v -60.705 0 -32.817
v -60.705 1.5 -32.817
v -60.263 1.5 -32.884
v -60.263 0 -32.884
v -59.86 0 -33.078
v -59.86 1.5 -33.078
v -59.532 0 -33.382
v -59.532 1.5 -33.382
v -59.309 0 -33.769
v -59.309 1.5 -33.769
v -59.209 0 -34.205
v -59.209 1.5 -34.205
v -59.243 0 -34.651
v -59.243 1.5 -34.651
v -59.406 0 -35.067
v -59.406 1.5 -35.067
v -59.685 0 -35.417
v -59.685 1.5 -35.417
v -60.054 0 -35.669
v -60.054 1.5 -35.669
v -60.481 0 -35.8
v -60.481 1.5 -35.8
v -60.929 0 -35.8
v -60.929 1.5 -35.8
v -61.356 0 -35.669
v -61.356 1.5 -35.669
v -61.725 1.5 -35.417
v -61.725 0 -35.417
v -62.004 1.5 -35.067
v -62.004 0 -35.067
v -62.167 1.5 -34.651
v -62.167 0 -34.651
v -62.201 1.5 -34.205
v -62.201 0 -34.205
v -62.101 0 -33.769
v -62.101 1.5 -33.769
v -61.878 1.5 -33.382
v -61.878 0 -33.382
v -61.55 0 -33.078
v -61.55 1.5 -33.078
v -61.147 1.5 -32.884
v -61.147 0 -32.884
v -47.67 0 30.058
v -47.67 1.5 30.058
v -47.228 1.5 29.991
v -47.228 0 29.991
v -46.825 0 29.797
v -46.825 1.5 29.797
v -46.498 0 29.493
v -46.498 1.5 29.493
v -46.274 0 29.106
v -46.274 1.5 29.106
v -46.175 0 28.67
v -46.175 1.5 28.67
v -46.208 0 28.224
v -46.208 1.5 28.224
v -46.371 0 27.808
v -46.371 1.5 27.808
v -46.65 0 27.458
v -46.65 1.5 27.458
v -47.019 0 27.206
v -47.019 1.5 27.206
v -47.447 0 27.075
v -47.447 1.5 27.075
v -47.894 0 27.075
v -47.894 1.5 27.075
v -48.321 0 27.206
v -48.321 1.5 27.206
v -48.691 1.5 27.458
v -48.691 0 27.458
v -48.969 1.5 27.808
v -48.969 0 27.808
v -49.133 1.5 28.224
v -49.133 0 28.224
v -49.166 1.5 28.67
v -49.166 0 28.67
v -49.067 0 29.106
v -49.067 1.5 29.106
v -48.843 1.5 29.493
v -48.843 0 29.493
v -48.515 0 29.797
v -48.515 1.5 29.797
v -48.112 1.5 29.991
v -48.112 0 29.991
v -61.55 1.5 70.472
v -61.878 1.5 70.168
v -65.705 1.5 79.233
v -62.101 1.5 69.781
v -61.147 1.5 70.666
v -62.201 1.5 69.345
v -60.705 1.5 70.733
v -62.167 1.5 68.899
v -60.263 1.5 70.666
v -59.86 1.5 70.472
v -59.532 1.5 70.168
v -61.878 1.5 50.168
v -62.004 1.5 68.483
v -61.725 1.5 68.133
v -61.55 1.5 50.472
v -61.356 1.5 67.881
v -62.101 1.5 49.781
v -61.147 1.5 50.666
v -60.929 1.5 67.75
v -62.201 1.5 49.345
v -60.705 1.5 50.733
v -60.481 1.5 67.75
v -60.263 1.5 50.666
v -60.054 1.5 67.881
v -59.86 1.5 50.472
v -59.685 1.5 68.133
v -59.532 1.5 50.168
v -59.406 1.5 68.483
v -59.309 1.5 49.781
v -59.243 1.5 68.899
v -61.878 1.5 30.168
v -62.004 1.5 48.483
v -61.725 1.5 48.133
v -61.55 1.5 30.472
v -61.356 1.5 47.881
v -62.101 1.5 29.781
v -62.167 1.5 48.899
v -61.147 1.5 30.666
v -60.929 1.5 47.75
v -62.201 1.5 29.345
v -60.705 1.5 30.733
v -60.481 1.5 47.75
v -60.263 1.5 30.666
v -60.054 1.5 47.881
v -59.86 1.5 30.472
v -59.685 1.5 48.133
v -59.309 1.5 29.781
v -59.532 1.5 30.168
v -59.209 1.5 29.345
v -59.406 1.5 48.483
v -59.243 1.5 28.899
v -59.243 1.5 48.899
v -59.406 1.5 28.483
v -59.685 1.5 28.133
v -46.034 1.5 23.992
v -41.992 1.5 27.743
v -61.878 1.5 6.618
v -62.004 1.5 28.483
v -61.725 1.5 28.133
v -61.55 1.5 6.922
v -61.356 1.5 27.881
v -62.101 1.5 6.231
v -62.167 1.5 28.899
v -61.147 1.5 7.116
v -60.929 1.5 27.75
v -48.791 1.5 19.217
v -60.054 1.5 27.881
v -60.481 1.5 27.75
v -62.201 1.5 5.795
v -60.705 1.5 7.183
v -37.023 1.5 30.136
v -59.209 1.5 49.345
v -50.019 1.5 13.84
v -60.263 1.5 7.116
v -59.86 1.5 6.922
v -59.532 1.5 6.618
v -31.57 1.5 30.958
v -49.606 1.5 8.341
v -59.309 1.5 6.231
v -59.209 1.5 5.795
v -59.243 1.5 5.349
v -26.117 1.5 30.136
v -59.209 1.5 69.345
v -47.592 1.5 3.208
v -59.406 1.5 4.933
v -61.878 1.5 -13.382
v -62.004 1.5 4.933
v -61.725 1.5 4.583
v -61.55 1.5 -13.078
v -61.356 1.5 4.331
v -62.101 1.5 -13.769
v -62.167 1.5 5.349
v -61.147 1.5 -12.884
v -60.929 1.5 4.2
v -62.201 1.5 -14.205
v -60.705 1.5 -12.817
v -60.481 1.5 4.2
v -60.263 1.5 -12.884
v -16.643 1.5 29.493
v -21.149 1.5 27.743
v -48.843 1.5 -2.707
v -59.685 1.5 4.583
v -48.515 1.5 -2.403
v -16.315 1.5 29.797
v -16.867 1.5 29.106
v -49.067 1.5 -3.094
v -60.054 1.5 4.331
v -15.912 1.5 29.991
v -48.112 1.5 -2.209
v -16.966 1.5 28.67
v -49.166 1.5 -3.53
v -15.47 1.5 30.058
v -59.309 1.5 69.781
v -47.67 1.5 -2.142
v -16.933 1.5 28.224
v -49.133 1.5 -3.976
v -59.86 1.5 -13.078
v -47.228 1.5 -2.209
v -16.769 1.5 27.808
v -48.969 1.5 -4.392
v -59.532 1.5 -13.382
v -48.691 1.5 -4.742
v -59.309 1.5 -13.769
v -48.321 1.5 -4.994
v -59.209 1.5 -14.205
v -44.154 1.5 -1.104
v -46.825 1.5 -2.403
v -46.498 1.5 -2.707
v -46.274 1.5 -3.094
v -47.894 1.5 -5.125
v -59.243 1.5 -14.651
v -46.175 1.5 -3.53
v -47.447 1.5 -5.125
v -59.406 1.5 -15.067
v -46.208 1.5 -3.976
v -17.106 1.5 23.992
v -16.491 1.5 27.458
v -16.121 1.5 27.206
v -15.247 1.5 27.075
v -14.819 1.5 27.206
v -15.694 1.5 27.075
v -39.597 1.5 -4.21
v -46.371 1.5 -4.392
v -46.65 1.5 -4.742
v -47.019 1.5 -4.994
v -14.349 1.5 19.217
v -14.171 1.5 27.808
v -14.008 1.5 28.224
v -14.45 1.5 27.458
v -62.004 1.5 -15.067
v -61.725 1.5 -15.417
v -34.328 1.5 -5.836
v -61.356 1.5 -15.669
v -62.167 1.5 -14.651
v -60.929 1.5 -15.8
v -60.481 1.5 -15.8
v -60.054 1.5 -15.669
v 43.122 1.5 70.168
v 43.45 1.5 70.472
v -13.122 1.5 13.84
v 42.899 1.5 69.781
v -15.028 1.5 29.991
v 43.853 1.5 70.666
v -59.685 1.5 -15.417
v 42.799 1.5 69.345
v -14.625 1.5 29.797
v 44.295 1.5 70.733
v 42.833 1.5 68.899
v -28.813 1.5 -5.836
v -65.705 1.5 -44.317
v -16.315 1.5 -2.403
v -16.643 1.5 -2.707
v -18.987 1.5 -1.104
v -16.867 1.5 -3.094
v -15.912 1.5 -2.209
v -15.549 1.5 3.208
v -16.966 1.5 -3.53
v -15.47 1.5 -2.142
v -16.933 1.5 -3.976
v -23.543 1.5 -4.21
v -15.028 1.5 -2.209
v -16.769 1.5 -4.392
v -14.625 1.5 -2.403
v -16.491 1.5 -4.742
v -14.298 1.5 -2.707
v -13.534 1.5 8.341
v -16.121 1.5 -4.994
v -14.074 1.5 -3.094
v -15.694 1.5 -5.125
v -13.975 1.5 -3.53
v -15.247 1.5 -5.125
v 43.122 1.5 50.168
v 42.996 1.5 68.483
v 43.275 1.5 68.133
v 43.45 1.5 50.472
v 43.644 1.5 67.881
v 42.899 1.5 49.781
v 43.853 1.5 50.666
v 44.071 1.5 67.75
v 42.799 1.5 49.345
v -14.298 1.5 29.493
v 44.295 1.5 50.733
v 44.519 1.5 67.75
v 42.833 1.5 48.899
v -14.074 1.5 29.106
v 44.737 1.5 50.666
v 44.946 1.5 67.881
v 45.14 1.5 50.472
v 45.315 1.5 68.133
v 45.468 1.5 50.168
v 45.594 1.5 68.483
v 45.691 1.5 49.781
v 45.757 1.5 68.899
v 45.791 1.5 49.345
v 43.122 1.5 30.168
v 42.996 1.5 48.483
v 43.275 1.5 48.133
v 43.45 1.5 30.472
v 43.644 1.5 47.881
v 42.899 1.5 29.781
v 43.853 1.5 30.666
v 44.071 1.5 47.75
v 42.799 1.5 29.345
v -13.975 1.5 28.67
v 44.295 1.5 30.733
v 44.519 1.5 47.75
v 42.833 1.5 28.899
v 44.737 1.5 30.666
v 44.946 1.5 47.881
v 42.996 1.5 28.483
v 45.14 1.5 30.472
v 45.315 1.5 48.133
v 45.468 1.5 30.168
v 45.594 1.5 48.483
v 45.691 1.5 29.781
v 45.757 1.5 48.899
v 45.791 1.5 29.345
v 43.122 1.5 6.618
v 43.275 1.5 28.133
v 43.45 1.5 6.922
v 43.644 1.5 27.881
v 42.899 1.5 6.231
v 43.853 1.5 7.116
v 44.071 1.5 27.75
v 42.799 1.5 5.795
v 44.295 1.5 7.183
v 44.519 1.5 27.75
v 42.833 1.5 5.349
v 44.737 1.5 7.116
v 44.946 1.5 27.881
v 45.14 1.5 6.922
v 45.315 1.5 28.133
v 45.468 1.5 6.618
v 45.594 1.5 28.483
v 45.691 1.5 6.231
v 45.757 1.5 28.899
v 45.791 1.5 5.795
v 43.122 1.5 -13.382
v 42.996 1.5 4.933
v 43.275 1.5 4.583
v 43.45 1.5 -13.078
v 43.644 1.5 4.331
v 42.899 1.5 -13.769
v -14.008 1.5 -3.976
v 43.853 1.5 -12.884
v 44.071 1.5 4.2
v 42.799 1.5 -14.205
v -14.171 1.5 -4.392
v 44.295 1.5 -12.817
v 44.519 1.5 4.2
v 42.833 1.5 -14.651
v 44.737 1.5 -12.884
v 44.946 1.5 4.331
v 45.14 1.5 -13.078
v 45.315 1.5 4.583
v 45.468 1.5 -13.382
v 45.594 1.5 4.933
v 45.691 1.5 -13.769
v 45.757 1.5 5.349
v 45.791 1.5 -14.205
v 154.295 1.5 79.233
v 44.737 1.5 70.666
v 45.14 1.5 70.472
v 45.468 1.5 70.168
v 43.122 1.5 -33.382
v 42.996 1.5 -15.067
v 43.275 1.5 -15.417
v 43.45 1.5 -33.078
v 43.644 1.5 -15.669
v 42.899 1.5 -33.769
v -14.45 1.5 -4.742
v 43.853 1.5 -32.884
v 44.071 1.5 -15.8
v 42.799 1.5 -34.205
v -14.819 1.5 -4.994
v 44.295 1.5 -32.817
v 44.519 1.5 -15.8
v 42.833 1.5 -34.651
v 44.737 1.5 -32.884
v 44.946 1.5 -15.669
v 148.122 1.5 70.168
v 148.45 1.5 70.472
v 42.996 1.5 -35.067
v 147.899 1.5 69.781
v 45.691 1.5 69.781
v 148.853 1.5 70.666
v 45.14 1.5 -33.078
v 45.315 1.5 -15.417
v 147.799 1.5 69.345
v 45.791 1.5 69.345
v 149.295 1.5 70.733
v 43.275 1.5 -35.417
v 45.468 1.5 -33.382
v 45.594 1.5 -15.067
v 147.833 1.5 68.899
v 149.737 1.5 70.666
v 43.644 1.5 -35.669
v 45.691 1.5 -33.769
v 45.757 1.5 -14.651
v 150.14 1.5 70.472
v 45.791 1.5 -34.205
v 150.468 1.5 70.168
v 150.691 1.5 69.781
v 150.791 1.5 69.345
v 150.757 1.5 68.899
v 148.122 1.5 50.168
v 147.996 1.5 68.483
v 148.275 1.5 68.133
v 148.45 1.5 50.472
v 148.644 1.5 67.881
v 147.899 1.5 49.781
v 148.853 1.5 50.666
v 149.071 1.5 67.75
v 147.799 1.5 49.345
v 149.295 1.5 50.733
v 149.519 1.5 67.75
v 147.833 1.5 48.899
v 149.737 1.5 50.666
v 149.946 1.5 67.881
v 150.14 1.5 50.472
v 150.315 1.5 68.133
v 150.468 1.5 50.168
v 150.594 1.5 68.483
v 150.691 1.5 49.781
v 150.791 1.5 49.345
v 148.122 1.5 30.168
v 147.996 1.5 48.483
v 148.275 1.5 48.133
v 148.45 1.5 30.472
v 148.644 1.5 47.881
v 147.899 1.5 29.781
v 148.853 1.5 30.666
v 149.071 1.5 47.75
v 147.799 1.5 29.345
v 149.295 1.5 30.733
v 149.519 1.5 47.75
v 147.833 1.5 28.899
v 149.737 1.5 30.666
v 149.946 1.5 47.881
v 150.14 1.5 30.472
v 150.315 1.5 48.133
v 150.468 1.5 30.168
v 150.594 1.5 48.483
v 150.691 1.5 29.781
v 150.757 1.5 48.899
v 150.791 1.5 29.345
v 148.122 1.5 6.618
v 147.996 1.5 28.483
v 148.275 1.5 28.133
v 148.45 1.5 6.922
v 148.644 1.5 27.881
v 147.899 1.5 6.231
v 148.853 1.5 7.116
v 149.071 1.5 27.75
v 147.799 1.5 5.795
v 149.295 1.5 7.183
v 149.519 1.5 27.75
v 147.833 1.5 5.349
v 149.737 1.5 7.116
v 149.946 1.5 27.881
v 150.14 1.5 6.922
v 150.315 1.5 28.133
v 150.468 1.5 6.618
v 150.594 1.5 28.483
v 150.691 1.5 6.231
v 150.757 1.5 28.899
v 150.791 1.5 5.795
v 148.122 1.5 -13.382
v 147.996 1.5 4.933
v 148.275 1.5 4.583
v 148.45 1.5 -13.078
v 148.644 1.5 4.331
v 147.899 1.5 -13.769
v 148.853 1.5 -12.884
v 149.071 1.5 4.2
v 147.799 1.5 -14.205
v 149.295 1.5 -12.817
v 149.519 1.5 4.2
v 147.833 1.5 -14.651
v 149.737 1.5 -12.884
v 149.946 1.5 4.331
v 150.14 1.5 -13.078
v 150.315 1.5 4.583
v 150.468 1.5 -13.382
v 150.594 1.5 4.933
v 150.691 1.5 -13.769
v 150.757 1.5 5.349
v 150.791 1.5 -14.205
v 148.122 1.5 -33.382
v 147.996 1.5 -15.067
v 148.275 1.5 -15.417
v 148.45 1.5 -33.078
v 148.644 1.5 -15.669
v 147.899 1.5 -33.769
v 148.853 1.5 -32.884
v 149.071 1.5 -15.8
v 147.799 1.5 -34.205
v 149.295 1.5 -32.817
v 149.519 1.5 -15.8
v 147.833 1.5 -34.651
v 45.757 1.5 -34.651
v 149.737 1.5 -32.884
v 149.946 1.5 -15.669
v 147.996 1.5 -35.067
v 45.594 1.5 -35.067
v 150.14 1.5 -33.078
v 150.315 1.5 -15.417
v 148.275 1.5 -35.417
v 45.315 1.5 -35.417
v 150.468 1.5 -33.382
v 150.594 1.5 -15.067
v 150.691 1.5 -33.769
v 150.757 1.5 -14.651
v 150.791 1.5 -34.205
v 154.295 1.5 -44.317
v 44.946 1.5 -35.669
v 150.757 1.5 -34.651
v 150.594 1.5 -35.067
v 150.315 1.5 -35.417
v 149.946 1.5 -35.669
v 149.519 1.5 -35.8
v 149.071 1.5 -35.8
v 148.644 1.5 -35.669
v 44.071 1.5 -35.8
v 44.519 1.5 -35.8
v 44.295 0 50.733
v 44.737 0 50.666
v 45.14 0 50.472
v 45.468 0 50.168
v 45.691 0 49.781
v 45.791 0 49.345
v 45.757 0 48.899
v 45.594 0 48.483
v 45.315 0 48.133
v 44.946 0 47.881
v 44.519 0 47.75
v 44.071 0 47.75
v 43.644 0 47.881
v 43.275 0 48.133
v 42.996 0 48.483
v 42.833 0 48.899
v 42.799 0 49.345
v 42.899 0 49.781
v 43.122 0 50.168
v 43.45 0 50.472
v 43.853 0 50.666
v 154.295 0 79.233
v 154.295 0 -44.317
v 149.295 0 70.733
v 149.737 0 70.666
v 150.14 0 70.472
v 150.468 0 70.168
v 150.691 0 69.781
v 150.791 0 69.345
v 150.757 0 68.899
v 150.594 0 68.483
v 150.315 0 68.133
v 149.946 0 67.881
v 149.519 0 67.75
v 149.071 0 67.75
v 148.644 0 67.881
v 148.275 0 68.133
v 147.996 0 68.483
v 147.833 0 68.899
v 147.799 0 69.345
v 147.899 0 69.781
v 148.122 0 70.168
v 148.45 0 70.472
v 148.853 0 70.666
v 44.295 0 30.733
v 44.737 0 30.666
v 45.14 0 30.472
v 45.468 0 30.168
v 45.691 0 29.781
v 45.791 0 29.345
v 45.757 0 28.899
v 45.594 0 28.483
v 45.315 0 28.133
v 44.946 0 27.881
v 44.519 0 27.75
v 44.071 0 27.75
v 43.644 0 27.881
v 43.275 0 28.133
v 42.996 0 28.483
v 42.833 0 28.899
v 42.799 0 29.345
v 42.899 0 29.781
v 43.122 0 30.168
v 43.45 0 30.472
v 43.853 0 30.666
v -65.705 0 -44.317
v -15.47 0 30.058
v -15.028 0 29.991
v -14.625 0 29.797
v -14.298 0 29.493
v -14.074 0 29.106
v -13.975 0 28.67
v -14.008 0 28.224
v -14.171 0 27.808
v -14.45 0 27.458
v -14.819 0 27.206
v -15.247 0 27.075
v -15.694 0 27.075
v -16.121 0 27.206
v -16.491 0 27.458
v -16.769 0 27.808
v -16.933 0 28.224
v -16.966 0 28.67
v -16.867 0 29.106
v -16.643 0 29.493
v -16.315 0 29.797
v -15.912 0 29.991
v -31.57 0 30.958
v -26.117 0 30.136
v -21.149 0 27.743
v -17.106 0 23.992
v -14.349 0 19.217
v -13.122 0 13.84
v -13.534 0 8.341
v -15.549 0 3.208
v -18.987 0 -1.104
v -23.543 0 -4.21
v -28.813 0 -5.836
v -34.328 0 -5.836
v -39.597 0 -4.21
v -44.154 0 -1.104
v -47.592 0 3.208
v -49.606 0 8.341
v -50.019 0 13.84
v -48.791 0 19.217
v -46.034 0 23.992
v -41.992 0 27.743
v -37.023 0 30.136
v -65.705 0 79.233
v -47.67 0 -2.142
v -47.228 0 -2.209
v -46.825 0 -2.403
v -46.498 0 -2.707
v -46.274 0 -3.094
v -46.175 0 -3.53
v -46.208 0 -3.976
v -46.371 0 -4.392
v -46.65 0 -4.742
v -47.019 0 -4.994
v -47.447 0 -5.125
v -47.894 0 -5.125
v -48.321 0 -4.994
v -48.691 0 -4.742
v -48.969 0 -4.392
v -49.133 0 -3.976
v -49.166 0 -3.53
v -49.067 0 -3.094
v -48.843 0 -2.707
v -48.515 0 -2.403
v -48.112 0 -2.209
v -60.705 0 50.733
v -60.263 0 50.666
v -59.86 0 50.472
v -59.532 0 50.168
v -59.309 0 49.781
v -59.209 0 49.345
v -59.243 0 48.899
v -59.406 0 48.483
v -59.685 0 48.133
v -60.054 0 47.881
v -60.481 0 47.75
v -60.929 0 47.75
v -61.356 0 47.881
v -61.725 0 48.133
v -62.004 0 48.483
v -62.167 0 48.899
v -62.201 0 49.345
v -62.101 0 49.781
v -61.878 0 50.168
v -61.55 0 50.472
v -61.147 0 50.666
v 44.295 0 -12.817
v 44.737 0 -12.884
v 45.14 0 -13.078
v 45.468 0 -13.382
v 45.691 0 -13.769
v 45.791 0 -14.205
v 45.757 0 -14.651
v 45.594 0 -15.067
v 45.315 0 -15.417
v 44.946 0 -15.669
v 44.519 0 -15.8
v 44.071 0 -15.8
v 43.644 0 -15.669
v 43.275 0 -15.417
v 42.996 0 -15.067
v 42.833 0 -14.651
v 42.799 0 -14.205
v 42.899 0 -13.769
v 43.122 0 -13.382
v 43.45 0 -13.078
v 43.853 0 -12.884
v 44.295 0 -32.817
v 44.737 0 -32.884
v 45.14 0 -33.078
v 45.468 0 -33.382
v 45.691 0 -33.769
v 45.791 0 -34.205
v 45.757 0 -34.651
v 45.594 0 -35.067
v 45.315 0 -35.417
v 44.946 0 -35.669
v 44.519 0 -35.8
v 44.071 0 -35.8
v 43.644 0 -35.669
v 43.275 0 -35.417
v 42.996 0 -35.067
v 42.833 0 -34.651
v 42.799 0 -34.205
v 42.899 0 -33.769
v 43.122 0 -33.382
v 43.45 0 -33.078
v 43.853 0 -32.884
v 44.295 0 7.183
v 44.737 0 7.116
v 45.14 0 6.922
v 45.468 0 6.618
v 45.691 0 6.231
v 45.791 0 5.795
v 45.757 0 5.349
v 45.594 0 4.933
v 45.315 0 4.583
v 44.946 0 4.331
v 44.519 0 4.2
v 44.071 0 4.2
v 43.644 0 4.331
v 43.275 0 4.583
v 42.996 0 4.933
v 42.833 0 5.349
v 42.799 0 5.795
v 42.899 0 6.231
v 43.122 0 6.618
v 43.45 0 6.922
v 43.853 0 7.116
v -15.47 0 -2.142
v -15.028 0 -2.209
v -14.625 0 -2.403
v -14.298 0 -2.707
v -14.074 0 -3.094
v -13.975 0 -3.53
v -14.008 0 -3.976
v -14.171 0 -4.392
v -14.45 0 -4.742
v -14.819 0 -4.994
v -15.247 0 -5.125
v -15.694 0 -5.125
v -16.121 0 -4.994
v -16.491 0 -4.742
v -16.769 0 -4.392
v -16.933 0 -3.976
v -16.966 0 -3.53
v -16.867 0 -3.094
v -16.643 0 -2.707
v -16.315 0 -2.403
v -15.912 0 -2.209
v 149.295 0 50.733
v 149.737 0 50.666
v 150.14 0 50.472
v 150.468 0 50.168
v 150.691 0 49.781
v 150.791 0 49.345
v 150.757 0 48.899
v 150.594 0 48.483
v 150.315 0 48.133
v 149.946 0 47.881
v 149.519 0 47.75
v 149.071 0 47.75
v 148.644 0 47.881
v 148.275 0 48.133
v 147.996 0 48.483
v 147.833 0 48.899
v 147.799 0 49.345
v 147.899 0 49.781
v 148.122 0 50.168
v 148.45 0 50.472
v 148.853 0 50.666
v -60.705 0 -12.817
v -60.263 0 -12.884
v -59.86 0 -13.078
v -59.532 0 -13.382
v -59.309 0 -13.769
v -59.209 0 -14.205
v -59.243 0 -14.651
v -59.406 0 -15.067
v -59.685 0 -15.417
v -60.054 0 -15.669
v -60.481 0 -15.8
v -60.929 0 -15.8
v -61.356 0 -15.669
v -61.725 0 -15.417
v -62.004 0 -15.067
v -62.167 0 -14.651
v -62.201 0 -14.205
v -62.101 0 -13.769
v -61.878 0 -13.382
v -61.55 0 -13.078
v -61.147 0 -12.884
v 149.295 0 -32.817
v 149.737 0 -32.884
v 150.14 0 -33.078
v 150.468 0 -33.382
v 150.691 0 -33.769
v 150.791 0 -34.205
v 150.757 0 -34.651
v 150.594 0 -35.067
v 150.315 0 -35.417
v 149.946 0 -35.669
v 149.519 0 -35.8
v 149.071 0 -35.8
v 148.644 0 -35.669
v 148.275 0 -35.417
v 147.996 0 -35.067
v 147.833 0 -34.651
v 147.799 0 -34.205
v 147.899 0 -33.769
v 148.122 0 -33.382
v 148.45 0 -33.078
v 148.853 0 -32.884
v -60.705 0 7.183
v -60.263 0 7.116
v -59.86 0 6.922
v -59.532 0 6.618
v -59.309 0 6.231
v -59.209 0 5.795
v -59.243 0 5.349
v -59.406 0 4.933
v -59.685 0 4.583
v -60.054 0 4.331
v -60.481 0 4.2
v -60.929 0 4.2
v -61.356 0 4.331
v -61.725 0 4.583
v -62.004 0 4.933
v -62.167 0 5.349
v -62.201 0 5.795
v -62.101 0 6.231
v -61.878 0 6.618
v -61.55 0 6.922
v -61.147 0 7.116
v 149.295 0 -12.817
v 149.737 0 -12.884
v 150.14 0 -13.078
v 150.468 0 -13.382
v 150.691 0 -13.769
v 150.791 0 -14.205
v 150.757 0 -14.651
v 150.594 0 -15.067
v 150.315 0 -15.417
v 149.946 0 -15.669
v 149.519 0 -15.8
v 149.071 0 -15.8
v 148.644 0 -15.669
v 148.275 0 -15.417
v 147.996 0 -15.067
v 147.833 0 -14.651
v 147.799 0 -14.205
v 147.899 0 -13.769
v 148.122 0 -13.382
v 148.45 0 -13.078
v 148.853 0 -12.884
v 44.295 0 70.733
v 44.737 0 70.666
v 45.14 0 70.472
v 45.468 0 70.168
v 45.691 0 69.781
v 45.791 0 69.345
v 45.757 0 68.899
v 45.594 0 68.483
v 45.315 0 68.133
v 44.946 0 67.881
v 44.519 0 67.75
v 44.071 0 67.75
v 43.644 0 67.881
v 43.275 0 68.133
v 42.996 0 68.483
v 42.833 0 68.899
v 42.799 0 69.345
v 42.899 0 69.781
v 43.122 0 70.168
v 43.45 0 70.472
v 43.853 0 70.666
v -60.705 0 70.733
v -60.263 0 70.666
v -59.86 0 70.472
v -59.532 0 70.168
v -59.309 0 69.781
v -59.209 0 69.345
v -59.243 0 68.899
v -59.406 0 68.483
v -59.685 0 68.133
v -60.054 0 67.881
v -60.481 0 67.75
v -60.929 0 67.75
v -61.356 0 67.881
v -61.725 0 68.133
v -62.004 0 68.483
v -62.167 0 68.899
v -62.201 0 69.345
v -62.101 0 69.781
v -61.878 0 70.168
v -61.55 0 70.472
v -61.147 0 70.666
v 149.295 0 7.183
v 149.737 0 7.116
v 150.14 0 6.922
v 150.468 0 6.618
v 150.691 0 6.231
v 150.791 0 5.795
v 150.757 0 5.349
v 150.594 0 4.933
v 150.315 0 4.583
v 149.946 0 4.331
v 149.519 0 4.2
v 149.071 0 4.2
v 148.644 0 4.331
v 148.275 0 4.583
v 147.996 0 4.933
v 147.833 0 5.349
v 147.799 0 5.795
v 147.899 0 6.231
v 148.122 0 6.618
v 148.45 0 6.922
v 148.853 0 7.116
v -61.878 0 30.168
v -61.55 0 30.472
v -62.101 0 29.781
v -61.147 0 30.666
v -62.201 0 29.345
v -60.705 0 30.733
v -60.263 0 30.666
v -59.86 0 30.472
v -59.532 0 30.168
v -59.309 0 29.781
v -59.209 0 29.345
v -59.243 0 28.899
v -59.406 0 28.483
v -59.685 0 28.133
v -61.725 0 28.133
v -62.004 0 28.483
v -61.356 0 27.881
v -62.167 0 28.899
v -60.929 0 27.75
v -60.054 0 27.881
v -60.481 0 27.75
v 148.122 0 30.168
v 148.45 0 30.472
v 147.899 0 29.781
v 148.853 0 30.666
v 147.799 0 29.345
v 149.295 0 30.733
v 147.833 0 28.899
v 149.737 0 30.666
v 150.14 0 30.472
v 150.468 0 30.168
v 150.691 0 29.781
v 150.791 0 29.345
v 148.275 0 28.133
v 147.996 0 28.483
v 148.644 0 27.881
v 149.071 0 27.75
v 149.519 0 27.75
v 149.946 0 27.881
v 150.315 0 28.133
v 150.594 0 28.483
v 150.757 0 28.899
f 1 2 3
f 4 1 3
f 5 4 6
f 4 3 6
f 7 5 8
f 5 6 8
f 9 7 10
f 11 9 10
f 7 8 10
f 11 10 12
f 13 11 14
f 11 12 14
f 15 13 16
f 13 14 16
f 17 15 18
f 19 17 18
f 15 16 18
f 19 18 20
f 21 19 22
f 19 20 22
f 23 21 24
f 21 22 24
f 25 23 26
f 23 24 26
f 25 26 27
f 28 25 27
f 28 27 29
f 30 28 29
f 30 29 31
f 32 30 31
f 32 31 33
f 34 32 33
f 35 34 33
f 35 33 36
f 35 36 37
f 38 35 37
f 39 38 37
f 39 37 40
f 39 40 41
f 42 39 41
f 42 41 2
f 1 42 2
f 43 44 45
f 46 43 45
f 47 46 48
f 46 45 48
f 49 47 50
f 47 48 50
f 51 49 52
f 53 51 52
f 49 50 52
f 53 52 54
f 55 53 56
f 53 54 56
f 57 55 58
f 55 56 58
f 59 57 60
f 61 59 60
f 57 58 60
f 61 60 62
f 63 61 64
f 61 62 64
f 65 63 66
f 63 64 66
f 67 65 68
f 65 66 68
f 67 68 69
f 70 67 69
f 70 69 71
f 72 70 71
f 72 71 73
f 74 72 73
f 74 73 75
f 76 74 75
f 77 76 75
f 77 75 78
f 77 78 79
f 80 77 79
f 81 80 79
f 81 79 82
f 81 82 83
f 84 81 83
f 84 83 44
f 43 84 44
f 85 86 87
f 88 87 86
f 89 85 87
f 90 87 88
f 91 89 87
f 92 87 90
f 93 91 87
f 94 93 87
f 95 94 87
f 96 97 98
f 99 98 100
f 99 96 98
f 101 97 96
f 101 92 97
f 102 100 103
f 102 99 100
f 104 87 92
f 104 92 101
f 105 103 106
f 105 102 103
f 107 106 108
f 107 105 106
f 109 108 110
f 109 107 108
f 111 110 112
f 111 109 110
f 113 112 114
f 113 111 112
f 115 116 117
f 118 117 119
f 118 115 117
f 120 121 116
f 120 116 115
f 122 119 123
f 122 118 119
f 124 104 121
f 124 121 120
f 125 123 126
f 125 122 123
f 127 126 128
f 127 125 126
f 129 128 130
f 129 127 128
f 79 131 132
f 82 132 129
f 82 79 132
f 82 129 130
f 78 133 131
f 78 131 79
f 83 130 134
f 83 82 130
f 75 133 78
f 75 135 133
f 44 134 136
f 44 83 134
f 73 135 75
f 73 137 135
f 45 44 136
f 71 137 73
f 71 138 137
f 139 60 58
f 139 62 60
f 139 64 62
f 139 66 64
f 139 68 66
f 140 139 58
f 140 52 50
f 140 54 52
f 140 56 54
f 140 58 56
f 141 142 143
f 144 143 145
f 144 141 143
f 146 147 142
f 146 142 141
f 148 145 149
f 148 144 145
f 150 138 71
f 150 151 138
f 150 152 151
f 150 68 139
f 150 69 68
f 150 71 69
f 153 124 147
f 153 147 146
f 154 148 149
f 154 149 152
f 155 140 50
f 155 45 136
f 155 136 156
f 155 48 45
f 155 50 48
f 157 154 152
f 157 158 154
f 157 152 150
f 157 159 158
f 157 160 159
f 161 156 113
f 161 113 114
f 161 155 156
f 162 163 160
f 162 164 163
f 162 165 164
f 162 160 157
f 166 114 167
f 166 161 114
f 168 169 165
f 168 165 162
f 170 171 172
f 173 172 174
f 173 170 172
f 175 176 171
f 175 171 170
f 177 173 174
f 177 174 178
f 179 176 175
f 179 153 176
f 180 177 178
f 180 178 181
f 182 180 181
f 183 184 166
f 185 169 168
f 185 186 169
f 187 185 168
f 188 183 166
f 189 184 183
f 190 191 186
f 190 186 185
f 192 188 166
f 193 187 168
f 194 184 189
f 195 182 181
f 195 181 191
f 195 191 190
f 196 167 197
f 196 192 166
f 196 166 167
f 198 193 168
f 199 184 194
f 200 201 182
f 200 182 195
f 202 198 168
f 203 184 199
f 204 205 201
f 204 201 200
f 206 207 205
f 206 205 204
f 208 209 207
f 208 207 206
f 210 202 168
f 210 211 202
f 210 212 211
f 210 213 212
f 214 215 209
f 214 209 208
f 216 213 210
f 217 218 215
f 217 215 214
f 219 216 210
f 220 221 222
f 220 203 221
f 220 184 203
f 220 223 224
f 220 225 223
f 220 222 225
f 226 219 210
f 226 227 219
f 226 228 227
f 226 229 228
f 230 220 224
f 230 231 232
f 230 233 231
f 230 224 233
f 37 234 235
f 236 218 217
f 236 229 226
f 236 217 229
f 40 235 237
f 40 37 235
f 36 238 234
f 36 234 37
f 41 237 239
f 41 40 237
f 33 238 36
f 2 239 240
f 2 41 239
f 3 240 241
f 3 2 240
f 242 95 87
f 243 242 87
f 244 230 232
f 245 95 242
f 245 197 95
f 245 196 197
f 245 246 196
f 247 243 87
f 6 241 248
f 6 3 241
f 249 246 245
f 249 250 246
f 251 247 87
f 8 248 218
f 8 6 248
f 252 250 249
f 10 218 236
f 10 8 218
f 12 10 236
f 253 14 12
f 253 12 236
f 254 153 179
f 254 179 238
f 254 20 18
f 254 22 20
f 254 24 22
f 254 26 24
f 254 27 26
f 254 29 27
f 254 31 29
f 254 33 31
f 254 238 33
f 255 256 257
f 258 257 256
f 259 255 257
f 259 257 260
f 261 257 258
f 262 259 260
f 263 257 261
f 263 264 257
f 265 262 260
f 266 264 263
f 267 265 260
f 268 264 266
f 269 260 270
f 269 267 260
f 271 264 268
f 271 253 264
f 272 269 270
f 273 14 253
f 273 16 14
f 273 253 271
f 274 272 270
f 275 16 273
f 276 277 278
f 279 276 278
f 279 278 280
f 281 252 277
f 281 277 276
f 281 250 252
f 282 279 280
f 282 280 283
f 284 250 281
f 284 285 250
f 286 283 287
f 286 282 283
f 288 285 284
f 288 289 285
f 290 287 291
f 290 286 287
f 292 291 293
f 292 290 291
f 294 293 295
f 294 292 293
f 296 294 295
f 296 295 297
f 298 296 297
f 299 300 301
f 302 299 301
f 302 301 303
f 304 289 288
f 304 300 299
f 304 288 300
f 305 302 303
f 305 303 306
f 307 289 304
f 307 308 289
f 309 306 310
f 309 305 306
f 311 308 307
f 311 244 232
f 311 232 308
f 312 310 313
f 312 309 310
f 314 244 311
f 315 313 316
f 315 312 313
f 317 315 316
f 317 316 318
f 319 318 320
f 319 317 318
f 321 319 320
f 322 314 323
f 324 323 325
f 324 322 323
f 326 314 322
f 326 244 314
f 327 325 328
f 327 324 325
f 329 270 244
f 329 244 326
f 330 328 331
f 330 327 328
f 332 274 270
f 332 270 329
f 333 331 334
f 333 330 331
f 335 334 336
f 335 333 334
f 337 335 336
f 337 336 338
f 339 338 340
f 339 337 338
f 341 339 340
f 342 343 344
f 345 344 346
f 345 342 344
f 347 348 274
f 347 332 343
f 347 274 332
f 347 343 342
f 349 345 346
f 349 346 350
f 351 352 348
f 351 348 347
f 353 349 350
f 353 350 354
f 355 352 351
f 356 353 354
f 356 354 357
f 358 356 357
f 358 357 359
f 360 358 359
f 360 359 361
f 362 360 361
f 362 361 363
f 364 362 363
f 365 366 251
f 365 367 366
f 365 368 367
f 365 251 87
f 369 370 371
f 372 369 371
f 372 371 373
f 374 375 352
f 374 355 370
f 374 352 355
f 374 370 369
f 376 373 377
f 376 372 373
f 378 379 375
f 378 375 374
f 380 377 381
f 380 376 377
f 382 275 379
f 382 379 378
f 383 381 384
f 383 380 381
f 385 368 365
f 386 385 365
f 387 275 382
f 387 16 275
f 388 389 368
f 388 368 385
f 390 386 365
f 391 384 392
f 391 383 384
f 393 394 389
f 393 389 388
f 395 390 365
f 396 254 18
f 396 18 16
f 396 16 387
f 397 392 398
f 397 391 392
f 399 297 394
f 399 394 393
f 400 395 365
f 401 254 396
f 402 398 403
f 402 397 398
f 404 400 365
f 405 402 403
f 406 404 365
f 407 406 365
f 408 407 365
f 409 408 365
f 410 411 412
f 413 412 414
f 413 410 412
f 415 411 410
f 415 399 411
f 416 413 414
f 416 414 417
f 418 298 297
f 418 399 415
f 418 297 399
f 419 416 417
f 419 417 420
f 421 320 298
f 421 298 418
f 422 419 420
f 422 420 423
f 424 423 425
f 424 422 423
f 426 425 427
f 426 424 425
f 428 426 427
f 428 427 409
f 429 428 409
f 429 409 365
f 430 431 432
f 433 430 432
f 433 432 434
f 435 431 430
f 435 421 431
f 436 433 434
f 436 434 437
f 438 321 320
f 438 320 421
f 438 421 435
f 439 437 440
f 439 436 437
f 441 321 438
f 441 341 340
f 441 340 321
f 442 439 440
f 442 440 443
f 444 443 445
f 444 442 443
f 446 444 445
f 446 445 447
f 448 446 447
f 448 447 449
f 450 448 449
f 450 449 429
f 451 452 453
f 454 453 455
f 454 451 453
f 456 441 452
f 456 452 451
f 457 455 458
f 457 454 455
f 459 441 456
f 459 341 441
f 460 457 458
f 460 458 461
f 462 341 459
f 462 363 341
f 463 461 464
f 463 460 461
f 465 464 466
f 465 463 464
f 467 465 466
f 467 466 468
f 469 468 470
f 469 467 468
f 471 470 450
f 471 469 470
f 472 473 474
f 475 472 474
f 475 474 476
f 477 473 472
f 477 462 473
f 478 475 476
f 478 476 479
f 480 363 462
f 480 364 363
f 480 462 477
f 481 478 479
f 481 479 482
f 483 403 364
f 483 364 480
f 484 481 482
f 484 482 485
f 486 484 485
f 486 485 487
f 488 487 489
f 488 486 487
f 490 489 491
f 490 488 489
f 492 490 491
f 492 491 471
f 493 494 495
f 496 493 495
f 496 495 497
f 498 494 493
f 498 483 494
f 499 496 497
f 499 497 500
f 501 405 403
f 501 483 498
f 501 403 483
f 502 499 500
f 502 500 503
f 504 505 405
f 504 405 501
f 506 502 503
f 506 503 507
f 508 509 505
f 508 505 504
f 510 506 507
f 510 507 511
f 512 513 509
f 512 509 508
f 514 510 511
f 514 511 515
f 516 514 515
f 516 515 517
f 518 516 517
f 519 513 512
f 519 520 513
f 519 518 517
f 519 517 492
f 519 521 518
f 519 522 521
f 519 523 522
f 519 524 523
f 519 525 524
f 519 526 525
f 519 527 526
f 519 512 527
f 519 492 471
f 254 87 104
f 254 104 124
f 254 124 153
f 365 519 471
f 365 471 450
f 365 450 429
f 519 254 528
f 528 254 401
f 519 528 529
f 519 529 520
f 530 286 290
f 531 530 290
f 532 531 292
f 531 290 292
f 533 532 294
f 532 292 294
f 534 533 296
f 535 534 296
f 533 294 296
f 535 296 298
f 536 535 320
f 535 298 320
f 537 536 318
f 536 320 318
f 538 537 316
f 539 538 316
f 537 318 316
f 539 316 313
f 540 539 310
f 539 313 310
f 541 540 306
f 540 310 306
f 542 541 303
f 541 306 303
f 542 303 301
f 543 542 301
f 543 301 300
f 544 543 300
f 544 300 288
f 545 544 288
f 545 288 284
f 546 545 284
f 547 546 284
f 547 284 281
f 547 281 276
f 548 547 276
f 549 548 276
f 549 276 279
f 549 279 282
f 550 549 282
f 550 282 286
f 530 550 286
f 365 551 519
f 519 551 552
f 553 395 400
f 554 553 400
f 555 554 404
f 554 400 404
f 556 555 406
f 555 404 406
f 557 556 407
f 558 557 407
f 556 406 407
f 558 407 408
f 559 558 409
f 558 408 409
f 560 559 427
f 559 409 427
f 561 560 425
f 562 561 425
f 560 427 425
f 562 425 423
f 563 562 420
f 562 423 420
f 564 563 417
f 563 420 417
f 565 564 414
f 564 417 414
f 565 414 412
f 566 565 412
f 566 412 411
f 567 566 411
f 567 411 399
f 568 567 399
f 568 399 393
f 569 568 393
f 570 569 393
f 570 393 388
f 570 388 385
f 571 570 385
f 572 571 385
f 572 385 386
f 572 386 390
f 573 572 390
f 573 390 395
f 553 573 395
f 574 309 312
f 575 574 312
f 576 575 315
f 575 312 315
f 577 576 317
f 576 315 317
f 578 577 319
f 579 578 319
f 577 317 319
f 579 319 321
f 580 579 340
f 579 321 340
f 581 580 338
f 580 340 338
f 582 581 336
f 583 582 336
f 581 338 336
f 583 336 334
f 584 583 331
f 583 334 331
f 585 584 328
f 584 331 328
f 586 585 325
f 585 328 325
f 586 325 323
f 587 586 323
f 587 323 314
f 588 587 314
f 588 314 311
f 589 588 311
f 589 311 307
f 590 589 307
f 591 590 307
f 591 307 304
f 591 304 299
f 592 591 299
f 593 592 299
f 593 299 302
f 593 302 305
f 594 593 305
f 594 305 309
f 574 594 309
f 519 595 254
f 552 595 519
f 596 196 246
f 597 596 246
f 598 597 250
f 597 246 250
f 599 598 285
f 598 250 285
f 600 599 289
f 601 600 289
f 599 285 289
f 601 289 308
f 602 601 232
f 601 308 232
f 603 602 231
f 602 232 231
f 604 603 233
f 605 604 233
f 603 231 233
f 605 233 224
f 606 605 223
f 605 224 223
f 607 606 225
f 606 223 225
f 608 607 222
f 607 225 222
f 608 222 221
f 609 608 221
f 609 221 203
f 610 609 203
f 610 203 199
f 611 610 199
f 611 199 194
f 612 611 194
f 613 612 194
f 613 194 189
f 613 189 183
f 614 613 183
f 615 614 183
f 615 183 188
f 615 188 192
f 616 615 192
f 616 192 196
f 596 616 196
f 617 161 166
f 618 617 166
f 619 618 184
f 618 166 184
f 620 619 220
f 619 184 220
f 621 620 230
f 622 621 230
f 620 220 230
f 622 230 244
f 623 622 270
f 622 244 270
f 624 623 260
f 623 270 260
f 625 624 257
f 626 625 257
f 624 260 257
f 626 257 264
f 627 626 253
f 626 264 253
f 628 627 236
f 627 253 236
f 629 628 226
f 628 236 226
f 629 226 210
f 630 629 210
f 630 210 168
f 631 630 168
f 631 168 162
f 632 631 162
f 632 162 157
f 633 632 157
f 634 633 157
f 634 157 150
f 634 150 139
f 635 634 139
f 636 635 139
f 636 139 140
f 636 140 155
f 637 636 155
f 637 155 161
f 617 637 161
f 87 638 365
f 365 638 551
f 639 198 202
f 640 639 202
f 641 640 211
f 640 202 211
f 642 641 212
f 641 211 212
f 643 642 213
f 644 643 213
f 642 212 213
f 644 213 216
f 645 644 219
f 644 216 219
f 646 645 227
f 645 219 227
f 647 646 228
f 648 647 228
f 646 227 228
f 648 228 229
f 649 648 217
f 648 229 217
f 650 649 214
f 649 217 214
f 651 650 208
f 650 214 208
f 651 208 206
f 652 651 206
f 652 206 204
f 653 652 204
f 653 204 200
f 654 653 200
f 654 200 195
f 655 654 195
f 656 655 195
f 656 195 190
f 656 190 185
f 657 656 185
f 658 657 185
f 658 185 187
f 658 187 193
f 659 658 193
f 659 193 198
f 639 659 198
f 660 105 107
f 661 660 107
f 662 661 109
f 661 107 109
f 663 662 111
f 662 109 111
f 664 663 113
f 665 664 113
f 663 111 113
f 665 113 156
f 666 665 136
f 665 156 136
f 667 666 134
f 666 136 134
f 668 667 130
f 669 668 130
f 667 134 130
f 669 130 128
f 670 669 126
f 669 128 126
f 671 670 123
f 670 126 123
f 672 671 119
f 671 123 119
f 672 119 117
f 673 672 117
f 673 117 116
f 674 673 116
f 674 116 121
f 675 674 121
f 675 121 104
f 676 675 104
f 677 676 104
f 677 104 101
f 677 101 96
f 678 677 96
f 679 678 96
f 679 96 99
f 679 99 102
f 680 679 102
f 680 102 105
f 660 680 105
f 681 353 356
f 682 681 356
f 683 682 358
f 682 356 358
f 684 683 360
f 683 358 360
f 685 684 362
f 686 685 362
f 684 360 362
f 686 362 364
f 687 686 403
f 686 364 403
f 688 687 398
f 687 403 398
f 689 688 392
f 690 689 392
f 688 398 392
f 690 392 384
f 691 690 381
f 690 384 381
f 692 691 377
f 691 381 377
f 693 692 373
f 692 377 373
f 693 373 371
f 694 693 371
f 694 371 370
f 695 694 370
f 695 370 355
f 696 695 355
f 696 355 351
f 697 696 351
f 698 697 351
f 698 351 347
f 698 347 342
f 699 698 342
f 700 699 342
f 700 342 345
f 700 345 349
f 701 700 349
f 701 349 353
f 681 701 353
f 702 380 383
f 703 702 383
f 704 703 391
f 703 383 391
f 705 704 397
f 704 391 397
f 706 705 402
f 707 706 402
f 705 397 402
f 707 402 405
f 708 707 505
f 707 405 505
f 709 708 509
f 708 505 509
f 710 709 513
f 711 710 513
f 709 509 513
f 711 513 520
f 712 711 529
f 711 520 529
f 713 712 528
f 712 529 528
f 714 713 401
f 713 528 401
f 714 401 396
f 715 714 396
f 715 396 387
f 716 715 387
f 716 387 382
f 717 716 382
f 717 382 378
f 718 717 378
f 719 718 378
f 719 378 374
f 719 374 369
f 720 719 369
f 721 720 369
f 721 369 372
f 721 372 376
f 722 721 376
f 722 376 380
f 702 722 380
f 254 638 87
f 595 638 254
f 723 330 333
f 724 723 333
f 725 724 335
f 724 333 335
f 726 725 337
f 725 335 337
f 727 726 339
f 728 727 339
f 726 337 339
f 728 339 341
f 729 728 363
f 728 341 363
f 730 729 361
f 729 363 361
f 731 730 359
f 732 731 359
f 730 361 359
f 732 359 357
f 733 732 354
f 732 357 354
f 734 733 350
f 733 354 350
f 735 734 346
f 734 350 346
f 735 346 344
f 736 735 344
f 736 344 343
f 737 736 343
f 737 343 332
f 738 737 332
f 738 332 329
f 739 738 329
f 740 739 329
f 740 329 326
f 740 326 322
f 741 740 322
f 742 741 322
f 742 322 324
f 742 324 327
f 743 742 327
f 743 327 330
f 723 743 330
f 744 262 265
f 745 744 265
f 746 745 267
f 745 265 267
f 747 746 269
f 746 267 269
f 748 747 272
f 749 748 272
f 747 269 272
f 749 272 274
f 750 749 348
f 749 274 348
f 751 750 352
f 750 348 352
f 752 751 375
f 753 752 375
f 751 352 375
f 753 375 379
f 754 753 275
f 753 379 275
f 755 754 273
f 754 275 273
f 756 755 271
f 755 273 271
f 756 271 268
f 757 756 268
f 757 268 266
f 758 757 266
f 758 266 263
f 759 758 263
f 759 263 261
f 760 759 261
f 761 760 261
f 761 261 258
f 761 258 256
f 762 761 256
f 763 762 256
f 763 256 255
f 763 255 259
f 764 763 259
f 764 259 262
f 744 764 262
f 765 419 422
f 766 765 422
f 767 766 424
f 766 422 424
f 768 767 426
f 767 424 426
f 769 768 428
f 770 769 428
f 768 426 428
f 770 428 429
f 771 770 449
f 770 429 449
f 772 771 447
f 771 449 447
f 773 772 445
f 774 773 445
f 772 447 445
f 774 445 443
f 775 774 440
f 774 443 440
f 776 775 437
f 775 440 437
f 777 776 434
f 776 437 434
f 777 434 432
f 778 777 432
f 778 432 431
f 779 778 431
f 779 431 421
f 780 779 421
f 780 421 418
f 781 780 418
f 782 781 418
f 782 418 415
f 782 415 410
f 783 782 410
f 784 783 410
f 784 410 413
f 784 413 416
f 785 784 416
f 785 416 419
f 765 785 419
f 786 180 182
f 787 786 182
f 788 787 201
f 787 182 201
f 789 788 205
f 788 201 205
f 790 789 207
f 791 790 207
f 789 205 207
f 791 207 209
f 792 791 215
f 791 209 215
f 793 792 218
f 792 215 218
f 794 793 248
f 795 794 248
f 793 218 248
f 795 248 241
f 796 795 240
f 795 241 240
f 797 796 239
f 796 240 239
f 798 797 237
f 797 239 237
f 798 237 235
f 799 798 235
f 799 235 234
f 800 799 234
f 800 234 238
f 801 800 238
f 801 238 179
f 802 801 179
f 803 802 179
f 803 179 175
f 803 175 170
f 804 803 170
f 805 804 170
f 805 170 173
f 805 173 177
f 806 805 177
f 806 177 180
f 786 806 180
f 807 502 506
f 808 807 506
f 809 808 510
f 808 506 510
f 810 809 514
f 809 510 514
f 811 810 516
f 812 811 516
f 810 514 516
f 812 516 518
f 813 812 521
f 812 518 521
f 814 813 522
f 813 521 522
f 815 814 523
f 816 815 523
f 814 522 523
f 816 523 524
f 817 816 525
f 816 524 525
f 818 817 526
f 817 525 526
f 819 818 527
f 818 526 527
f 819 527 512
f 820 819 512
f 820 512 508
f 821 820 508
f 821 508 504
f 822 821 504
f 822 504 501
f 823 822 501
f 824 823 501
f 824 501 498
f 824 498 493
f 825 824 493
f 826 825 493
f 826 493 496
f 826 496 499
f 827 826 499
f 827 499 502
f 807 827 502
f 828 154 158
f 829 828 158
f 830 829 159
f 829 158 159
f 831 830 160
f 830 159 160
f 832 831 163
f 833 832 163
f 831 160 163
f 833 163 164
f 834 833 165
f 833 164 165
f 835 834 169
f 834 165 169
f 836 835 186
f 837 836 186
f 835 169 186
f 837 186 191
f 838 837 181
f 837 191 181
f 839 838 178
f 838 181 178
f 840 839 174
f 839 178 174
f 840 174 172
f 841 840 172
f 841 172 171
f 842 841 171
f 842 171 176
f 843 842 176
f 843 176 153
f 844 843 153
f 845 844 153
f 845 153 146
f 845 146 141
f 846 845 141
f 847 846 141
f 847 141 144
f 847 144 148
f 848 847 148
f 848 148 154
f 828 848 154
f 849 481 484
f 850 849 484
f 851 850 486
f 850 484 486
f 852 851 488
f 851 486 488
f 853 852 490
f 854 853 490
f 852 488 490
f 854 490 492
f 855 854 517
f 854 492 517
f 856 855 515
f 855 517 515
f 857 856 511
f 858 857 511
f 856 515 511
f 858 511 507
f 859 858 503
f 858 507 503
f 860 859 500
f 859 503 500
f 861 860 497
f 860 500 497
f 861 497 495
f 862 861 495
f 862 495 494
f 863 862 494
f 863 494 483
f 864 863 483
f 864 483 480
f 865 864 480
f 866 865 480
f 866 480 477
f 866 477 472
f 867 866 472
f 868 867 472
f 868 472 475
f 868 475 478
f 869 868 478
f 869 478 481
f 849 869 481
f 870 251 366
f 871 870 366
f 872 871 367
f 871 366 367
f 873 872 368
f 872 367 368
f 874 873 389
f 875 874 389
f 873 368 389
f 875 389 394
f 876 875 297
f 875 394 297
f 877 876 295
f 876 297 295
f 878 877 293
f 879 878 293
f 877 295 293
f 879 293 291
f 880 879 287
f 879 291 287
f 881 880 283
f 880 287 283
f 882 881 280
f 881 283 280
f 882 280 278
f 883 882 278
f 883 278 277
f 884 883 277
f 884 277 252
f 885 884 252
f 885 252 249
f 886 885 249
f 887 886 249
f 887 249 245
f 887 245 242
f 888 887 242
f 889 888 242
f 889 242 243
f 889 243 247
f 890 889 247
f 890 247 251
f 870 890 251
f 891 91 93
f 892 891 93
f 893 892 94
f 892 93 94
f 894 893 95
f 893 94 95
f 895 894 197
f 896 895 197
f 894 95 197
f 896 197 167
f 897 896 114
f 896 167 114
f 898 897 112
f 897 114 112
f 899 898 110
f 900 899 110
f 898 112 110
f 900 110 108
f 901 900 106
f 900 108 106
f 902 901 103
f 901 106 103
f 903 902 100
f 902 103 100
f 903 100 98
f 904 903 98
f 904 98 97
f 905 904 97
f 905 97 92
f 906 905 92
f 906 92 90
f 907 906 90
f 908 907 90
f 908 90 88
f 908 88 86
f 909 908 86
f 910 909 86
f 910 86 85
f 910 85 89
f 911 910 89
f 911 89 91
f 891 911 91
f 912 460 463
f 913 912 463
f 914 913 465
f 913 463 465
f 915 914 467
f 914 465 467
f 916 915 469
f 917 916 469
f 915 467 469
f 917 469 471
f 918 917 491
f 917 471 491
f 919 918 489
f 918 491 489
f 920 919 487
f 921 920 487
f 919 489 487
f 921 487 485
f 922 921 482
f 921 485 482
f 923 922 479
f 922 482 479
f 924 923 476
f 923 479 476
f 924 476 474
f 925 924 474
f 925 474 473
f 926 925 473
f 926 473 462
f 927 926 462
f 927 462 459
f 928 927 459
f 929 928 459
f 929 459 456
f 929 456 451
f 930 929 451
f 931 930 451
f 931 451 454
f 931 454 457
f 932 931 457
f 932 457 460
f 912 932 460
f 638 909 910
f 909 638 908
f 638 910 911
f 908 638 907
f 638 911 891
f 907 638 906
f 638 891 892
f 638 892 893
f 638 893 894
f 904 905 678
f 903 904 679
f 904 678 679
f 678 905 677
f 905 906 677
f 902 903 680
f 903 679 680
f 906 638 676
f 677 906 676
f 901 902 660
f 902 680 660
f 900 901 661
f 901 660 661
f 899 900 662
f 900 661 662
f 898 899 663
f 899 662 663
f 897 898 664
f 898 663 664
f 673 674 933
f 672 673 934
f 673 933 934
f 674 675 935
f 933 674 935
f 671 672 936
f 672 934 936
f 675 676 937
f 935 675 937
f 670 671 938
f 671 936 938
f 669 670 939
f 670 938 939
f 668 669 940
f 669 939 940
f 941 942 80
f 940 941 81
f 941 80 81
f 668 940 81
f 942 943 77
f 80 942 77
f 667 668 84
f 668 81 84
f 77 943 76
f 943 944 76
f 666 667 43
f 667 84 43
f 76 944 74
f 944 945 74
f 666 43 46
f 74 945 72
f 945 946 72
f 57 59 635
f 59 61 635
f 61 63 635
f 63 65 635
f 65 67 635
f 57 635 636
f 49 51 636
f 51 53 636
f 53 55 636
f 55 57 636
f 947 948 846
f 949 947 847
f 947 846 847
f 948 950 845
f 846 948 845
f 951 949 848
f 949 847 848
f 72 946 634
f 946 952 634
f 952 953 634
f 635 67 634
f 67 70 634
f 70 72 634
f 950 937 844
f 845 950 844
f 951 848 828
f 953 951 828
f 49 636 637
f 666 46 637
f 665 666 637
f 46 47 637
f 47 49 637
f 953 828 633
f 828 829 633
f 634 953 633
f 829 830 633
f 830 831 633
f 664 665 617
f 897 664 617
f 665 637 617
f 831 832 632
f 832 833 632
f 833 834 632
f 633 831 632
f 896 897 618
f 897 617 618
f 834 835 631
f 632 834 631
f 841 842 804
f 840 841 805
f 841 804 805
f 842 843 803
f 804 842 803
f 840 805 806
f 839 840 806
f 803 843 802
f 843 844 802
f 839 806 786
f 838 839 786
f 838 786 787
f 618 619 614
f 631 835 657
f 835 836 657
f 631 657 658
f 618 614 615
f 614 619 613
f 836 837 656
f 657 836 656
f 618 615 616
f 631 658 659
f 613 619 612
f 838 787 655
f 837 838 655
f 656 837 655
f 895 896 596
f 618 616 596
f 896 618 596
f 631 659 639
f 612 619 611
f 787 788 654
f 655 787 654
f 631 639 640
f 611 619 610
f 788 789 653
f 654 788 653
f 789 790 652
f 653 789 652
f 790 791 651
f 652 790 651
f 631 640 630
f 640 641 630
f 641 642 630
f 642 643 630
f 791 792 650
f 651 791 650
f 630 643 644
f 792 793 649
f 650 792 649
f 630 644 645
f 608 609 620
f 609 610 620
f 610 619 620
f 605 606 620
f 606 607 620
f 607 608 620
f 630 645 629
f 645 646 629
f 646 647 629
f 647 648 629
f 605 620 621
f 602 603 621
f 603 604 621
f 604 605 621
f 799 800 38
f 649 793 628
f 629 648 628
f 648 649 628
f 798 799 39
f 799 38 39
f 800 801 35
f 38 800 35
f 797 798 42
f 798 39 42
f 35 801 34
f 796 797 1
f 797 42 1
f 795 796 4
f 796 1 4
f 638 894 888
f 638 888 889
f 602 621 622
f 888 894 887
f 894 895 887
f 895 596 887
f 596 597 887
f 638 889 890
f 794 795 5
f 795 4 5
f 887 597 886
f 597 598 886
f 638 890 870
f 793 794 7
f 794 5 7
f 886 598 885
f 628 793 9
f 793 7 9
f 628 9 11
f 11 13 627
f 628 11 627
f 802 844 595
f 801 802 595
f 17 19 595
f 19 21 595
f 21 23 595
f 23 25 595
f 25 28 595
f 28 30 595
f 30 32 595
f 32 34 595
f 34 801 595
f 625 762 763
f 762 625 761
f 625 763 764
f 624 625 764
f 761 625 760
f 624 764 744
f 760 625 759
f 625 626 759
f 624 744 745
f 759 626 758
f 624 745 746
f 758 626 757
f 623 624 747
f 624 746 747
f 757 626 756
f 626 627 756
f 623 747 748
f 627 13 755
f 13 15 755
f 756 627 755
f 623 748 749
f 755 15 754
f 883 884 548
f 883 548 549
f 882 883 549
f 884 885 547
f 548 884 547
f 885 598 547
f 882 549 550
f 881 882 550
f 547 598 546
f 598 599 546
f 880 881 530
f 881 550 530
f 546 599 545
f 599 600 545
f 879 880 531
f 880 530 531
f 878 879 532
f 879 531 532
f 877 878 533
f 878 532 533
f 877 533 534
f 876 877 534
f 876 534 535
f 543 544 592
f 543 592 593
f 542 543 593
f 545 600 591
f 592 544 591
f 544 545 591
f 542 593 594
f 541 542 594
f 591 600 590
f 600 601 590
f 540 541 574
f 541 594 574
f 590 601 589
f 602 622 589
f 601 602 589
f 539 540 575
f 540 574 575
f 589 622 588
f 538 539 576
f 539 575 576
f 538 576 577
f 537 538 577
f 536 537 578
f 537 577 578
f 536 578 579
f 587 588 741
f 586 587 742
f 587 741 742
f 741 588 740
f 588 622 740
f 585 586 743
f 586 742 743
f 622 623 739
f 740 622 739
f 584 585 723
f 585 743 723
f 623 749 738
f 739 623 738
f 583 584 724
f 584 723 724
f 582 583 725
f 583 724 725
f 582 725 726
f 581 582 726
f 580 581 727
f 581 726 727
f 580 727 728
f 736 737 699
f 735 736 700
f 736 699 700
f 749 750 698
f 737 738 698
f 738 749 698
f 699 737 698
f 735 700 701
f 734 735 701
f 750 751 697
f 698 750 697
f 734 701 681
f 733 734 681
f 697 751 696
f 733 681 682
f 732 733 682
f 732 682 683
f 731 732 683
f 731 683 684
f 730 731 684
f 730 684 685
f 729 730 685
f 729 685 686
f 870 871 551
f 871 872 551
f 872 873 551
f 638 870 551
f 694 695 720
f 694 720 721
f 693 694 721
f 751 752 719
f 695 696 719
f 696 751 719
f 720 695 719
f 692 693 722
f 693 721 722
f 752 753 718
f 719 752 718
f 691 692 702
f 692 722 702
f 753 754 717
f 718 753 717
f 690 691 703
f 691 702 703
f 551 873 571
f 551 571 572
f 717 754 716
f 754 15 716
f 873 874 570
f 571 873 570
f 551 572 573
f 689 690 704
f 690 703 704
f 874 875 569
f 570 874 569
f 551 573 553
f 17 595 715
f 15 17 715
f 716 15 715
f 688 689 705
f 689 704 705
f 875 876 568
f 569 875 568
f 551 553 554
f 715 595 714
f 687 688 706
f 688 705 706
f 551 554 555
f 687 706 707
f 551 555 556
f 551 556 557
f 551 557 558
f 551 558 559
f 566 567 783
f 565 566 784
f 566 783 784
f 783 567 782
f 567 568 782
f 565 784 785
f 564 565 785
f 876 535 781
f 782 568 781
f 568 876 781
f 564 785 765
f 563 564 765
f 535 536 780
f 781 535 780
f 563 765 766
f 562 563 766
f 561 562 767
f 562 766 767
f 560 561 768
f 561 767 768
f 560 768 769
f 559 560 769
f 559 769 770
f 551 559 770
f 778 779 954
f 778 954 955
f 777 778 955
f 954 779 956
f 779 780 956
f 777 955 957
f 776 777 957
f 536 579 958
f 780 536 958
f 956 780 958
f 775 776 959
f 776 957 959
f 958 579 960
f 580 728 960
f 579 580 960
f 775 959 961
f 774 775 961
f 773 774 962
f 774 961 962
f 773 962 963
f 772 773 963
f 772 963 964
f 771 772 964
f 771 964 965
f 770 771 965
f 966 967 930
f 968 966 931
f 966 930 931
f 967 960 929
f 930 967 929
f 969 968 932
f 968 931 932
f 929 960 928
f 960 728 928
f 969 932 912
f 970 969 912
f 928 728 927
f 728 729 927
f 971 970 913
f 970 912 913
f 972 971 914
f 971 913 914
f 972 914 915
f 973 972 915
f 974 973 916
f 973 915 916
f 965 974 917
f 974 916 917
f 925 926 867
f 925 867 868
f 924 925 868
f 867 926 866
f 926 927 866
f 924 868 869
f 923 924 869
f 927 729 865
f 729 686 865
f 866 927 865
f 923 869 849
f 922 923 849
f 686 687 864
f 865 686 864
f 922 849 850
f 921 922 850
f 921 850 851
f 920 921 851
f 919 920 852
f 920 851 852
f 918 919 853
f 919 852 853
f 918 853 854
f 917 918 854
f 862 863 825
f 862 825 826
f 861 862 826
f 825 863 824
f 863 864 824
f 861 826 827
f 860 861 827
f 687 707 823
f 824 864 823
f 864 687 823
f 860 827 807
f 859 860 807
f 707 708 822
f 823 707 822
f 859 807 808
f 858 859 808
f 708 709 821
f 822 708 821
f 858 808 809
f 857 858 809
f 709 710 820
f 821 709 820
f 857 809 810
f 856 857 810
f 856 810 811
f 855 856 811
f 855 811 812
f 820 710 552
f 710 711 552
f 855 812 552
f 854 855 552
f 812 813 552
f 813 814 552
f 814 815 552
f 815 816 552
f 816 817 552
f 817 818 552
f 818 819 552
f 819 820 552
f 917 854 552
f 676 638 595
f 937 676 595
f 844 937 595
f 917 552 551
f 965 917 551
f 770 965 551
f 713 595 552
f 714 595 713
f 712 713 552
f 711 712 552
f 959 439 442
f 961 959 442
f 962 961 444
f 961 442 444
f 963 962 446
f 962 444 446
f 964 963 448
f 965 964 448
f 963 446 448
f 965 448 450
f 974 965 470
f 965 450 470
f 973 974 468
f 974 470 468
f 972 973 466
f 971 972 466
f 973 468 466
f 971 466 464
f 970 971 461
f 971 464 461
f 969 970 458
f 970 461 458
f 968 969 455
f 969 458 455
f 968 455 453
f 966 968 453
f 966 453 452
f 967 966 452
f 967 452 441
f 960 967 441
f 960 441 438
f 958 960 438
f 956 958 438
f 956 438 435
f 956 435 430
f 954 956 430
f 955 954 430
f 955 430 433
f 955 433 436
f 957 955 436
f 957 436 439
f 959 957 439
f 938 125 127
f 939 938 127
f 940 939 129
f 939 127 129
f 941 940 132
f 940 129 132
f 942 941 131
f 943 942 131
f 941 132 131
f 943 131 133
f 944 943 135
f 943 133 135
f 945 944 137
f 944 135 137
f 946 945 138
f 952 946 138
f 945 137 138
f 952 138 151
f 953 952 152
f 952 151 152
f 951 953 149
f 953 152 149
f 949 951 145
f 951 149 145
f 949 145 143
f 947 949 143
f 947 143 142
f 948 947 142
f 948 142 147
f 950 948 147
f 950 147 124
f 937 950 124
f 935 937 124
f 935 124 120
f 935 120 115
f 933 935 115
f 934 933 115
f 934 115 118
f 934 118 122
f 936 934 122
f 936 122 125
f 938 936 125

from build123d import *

# Parameters (mm, degrees)
SKETCH_1_W          = 220
SKETCH_1_H          = 123.55
EXTRUDE_1_DEPTH     = 1.5
SKETCH_2_R          = 18.5
SKETCH_2_R_2        = 1.5
CUT_EXTRUDE_1_DEPTH = 10


with BuildPart() as part:
    # 草图1 → 凸台-拉伸1 (new body)
    with BuildSketch(Plane(origin=(0, 0, 0), x_dir=(1, 0, 0), z_dir=(0, 1, 0))):
        with Locations((44.295012832, -17.457747405)):
            Rectangle(SKETCH_1_W, SKETCH_1_H)
    extrude(amount=EXTRUDE_1_DEPTH)

    # 草图2 → 切除-拉伸1 (cut)
    with BuildSketch(Plane(origin=(0, 1.5, 0), x_dir=(1, 0, 0), z_dir=(0, 1, 0))):
        with Locations(Location((-31.57031265, -12.457747405, 0), (0, 0, 270))):
            Circle(SKETCH_2_R)
        with Locations(Location((-47.67031265, 3.642252595, 0), (0, 0, 270))):
            Circle(SKETCH_2_R_2)
        with Locations(Location((-47.67031265, -28.557747405, 0), (0, 0, 270))):
            Circle(SKETCH_2_R_2)
        with Locations(Location((149.295012832, -69.232747405, 0), (0, 0, 270))):
            Circle(SKETCH_2_R_2)
        with Locations(Location((44.295012832, -69.232747405, 0), (0, 0, 270))):
            Circle(SKETCH_2_R_2)
        with Locations(Location((-60.704987168, -69.232747405, 0), (0, 0, 270))):
            Circle(SKETCH_2_R_2)
        with Locations(Location((44.295012832, -49.232747405, 0), (0, 0, 270))):
            Circle(SKETCH_2_R_2)
        with Locations(Location((-60.704987168, -49.232747405, 0), (0, 0, 270))):
            Circle(SKETCH_2_R_2)
        with Locations(Location((149.295012832, -49.232747405, 0), (0, 0, 270))):
            Circle(SKETCH_2_R_2)
        with Locations(Location((149.295012832, 14.317252595, 0), (0, 0, 270))):
            Circle(SKETCH_2_R_2)
        with Locations(Location((-60.704987168, 14.317252595, 0), (0, 0, 270))):
            Circle(SKETCH_2_R_2)
        with Locations(Location((44.295012832, 14.317252595, 0), (0, 0, 270))):
            Circle(SKETCH_2_R_2)
        with Locations(Location((-60.704987168, 34.317252595, 0), (0, 0, 270))):
            Circle(SKETCH_2_R_2)
        with Locations(Location((44.295012832, 34.317252595, 0), (0, 0, 270))):
            Circle(SKETCH_2_R_2)
        with Locations(Location((149.295012832, 34.317252595, 0), (0, 0, 270))):
            Circle(SKETCH_2_R_2)
        with Locations(Location((149.295012832, -29.232747405, 0), (0, 0, 270))):
            Circle(SKETCH_2_R_2)
        with Locations(Location((44.295012832, -29.232747405, 0), (0, 0, 270))):
            Circle(SKETCH_2_R_2)
        with Locations(Location((-60.704987168, -29.232747405, 0), (0, 0, 270))):
            Circle(SKETCH_2_R_2)
        with Locations(Location((149.295012832, -5.682747405, 0), (0, 0, 270))):
            Circle(SKETCH_2_R_2)
        with Locations(Location((44.295012832, -5.682747405, 0), (0, 0, 270))):
            Circle(SKETCH_2_R_2)
        with Locations(Location((-60.704987168, -5.682747405, 0), (0, 0, 270))):
            Circle(SKETCH_2_R_2)
        with Locations(Location((-15.47031265, 3.642252595, 0), (0, 0, 270))):
            Circle(SKETCH_2_R_2)
        with Locations(Location((-15.47031265, -28.557747405, 0), (0, 0, 270))):
            Circle(SKETCH_2_R_2)
    extrude(amount=-CUT_EXTRUDE_1_DEPTH, mode=Mode.SUBTRACT)


solid = part.part
